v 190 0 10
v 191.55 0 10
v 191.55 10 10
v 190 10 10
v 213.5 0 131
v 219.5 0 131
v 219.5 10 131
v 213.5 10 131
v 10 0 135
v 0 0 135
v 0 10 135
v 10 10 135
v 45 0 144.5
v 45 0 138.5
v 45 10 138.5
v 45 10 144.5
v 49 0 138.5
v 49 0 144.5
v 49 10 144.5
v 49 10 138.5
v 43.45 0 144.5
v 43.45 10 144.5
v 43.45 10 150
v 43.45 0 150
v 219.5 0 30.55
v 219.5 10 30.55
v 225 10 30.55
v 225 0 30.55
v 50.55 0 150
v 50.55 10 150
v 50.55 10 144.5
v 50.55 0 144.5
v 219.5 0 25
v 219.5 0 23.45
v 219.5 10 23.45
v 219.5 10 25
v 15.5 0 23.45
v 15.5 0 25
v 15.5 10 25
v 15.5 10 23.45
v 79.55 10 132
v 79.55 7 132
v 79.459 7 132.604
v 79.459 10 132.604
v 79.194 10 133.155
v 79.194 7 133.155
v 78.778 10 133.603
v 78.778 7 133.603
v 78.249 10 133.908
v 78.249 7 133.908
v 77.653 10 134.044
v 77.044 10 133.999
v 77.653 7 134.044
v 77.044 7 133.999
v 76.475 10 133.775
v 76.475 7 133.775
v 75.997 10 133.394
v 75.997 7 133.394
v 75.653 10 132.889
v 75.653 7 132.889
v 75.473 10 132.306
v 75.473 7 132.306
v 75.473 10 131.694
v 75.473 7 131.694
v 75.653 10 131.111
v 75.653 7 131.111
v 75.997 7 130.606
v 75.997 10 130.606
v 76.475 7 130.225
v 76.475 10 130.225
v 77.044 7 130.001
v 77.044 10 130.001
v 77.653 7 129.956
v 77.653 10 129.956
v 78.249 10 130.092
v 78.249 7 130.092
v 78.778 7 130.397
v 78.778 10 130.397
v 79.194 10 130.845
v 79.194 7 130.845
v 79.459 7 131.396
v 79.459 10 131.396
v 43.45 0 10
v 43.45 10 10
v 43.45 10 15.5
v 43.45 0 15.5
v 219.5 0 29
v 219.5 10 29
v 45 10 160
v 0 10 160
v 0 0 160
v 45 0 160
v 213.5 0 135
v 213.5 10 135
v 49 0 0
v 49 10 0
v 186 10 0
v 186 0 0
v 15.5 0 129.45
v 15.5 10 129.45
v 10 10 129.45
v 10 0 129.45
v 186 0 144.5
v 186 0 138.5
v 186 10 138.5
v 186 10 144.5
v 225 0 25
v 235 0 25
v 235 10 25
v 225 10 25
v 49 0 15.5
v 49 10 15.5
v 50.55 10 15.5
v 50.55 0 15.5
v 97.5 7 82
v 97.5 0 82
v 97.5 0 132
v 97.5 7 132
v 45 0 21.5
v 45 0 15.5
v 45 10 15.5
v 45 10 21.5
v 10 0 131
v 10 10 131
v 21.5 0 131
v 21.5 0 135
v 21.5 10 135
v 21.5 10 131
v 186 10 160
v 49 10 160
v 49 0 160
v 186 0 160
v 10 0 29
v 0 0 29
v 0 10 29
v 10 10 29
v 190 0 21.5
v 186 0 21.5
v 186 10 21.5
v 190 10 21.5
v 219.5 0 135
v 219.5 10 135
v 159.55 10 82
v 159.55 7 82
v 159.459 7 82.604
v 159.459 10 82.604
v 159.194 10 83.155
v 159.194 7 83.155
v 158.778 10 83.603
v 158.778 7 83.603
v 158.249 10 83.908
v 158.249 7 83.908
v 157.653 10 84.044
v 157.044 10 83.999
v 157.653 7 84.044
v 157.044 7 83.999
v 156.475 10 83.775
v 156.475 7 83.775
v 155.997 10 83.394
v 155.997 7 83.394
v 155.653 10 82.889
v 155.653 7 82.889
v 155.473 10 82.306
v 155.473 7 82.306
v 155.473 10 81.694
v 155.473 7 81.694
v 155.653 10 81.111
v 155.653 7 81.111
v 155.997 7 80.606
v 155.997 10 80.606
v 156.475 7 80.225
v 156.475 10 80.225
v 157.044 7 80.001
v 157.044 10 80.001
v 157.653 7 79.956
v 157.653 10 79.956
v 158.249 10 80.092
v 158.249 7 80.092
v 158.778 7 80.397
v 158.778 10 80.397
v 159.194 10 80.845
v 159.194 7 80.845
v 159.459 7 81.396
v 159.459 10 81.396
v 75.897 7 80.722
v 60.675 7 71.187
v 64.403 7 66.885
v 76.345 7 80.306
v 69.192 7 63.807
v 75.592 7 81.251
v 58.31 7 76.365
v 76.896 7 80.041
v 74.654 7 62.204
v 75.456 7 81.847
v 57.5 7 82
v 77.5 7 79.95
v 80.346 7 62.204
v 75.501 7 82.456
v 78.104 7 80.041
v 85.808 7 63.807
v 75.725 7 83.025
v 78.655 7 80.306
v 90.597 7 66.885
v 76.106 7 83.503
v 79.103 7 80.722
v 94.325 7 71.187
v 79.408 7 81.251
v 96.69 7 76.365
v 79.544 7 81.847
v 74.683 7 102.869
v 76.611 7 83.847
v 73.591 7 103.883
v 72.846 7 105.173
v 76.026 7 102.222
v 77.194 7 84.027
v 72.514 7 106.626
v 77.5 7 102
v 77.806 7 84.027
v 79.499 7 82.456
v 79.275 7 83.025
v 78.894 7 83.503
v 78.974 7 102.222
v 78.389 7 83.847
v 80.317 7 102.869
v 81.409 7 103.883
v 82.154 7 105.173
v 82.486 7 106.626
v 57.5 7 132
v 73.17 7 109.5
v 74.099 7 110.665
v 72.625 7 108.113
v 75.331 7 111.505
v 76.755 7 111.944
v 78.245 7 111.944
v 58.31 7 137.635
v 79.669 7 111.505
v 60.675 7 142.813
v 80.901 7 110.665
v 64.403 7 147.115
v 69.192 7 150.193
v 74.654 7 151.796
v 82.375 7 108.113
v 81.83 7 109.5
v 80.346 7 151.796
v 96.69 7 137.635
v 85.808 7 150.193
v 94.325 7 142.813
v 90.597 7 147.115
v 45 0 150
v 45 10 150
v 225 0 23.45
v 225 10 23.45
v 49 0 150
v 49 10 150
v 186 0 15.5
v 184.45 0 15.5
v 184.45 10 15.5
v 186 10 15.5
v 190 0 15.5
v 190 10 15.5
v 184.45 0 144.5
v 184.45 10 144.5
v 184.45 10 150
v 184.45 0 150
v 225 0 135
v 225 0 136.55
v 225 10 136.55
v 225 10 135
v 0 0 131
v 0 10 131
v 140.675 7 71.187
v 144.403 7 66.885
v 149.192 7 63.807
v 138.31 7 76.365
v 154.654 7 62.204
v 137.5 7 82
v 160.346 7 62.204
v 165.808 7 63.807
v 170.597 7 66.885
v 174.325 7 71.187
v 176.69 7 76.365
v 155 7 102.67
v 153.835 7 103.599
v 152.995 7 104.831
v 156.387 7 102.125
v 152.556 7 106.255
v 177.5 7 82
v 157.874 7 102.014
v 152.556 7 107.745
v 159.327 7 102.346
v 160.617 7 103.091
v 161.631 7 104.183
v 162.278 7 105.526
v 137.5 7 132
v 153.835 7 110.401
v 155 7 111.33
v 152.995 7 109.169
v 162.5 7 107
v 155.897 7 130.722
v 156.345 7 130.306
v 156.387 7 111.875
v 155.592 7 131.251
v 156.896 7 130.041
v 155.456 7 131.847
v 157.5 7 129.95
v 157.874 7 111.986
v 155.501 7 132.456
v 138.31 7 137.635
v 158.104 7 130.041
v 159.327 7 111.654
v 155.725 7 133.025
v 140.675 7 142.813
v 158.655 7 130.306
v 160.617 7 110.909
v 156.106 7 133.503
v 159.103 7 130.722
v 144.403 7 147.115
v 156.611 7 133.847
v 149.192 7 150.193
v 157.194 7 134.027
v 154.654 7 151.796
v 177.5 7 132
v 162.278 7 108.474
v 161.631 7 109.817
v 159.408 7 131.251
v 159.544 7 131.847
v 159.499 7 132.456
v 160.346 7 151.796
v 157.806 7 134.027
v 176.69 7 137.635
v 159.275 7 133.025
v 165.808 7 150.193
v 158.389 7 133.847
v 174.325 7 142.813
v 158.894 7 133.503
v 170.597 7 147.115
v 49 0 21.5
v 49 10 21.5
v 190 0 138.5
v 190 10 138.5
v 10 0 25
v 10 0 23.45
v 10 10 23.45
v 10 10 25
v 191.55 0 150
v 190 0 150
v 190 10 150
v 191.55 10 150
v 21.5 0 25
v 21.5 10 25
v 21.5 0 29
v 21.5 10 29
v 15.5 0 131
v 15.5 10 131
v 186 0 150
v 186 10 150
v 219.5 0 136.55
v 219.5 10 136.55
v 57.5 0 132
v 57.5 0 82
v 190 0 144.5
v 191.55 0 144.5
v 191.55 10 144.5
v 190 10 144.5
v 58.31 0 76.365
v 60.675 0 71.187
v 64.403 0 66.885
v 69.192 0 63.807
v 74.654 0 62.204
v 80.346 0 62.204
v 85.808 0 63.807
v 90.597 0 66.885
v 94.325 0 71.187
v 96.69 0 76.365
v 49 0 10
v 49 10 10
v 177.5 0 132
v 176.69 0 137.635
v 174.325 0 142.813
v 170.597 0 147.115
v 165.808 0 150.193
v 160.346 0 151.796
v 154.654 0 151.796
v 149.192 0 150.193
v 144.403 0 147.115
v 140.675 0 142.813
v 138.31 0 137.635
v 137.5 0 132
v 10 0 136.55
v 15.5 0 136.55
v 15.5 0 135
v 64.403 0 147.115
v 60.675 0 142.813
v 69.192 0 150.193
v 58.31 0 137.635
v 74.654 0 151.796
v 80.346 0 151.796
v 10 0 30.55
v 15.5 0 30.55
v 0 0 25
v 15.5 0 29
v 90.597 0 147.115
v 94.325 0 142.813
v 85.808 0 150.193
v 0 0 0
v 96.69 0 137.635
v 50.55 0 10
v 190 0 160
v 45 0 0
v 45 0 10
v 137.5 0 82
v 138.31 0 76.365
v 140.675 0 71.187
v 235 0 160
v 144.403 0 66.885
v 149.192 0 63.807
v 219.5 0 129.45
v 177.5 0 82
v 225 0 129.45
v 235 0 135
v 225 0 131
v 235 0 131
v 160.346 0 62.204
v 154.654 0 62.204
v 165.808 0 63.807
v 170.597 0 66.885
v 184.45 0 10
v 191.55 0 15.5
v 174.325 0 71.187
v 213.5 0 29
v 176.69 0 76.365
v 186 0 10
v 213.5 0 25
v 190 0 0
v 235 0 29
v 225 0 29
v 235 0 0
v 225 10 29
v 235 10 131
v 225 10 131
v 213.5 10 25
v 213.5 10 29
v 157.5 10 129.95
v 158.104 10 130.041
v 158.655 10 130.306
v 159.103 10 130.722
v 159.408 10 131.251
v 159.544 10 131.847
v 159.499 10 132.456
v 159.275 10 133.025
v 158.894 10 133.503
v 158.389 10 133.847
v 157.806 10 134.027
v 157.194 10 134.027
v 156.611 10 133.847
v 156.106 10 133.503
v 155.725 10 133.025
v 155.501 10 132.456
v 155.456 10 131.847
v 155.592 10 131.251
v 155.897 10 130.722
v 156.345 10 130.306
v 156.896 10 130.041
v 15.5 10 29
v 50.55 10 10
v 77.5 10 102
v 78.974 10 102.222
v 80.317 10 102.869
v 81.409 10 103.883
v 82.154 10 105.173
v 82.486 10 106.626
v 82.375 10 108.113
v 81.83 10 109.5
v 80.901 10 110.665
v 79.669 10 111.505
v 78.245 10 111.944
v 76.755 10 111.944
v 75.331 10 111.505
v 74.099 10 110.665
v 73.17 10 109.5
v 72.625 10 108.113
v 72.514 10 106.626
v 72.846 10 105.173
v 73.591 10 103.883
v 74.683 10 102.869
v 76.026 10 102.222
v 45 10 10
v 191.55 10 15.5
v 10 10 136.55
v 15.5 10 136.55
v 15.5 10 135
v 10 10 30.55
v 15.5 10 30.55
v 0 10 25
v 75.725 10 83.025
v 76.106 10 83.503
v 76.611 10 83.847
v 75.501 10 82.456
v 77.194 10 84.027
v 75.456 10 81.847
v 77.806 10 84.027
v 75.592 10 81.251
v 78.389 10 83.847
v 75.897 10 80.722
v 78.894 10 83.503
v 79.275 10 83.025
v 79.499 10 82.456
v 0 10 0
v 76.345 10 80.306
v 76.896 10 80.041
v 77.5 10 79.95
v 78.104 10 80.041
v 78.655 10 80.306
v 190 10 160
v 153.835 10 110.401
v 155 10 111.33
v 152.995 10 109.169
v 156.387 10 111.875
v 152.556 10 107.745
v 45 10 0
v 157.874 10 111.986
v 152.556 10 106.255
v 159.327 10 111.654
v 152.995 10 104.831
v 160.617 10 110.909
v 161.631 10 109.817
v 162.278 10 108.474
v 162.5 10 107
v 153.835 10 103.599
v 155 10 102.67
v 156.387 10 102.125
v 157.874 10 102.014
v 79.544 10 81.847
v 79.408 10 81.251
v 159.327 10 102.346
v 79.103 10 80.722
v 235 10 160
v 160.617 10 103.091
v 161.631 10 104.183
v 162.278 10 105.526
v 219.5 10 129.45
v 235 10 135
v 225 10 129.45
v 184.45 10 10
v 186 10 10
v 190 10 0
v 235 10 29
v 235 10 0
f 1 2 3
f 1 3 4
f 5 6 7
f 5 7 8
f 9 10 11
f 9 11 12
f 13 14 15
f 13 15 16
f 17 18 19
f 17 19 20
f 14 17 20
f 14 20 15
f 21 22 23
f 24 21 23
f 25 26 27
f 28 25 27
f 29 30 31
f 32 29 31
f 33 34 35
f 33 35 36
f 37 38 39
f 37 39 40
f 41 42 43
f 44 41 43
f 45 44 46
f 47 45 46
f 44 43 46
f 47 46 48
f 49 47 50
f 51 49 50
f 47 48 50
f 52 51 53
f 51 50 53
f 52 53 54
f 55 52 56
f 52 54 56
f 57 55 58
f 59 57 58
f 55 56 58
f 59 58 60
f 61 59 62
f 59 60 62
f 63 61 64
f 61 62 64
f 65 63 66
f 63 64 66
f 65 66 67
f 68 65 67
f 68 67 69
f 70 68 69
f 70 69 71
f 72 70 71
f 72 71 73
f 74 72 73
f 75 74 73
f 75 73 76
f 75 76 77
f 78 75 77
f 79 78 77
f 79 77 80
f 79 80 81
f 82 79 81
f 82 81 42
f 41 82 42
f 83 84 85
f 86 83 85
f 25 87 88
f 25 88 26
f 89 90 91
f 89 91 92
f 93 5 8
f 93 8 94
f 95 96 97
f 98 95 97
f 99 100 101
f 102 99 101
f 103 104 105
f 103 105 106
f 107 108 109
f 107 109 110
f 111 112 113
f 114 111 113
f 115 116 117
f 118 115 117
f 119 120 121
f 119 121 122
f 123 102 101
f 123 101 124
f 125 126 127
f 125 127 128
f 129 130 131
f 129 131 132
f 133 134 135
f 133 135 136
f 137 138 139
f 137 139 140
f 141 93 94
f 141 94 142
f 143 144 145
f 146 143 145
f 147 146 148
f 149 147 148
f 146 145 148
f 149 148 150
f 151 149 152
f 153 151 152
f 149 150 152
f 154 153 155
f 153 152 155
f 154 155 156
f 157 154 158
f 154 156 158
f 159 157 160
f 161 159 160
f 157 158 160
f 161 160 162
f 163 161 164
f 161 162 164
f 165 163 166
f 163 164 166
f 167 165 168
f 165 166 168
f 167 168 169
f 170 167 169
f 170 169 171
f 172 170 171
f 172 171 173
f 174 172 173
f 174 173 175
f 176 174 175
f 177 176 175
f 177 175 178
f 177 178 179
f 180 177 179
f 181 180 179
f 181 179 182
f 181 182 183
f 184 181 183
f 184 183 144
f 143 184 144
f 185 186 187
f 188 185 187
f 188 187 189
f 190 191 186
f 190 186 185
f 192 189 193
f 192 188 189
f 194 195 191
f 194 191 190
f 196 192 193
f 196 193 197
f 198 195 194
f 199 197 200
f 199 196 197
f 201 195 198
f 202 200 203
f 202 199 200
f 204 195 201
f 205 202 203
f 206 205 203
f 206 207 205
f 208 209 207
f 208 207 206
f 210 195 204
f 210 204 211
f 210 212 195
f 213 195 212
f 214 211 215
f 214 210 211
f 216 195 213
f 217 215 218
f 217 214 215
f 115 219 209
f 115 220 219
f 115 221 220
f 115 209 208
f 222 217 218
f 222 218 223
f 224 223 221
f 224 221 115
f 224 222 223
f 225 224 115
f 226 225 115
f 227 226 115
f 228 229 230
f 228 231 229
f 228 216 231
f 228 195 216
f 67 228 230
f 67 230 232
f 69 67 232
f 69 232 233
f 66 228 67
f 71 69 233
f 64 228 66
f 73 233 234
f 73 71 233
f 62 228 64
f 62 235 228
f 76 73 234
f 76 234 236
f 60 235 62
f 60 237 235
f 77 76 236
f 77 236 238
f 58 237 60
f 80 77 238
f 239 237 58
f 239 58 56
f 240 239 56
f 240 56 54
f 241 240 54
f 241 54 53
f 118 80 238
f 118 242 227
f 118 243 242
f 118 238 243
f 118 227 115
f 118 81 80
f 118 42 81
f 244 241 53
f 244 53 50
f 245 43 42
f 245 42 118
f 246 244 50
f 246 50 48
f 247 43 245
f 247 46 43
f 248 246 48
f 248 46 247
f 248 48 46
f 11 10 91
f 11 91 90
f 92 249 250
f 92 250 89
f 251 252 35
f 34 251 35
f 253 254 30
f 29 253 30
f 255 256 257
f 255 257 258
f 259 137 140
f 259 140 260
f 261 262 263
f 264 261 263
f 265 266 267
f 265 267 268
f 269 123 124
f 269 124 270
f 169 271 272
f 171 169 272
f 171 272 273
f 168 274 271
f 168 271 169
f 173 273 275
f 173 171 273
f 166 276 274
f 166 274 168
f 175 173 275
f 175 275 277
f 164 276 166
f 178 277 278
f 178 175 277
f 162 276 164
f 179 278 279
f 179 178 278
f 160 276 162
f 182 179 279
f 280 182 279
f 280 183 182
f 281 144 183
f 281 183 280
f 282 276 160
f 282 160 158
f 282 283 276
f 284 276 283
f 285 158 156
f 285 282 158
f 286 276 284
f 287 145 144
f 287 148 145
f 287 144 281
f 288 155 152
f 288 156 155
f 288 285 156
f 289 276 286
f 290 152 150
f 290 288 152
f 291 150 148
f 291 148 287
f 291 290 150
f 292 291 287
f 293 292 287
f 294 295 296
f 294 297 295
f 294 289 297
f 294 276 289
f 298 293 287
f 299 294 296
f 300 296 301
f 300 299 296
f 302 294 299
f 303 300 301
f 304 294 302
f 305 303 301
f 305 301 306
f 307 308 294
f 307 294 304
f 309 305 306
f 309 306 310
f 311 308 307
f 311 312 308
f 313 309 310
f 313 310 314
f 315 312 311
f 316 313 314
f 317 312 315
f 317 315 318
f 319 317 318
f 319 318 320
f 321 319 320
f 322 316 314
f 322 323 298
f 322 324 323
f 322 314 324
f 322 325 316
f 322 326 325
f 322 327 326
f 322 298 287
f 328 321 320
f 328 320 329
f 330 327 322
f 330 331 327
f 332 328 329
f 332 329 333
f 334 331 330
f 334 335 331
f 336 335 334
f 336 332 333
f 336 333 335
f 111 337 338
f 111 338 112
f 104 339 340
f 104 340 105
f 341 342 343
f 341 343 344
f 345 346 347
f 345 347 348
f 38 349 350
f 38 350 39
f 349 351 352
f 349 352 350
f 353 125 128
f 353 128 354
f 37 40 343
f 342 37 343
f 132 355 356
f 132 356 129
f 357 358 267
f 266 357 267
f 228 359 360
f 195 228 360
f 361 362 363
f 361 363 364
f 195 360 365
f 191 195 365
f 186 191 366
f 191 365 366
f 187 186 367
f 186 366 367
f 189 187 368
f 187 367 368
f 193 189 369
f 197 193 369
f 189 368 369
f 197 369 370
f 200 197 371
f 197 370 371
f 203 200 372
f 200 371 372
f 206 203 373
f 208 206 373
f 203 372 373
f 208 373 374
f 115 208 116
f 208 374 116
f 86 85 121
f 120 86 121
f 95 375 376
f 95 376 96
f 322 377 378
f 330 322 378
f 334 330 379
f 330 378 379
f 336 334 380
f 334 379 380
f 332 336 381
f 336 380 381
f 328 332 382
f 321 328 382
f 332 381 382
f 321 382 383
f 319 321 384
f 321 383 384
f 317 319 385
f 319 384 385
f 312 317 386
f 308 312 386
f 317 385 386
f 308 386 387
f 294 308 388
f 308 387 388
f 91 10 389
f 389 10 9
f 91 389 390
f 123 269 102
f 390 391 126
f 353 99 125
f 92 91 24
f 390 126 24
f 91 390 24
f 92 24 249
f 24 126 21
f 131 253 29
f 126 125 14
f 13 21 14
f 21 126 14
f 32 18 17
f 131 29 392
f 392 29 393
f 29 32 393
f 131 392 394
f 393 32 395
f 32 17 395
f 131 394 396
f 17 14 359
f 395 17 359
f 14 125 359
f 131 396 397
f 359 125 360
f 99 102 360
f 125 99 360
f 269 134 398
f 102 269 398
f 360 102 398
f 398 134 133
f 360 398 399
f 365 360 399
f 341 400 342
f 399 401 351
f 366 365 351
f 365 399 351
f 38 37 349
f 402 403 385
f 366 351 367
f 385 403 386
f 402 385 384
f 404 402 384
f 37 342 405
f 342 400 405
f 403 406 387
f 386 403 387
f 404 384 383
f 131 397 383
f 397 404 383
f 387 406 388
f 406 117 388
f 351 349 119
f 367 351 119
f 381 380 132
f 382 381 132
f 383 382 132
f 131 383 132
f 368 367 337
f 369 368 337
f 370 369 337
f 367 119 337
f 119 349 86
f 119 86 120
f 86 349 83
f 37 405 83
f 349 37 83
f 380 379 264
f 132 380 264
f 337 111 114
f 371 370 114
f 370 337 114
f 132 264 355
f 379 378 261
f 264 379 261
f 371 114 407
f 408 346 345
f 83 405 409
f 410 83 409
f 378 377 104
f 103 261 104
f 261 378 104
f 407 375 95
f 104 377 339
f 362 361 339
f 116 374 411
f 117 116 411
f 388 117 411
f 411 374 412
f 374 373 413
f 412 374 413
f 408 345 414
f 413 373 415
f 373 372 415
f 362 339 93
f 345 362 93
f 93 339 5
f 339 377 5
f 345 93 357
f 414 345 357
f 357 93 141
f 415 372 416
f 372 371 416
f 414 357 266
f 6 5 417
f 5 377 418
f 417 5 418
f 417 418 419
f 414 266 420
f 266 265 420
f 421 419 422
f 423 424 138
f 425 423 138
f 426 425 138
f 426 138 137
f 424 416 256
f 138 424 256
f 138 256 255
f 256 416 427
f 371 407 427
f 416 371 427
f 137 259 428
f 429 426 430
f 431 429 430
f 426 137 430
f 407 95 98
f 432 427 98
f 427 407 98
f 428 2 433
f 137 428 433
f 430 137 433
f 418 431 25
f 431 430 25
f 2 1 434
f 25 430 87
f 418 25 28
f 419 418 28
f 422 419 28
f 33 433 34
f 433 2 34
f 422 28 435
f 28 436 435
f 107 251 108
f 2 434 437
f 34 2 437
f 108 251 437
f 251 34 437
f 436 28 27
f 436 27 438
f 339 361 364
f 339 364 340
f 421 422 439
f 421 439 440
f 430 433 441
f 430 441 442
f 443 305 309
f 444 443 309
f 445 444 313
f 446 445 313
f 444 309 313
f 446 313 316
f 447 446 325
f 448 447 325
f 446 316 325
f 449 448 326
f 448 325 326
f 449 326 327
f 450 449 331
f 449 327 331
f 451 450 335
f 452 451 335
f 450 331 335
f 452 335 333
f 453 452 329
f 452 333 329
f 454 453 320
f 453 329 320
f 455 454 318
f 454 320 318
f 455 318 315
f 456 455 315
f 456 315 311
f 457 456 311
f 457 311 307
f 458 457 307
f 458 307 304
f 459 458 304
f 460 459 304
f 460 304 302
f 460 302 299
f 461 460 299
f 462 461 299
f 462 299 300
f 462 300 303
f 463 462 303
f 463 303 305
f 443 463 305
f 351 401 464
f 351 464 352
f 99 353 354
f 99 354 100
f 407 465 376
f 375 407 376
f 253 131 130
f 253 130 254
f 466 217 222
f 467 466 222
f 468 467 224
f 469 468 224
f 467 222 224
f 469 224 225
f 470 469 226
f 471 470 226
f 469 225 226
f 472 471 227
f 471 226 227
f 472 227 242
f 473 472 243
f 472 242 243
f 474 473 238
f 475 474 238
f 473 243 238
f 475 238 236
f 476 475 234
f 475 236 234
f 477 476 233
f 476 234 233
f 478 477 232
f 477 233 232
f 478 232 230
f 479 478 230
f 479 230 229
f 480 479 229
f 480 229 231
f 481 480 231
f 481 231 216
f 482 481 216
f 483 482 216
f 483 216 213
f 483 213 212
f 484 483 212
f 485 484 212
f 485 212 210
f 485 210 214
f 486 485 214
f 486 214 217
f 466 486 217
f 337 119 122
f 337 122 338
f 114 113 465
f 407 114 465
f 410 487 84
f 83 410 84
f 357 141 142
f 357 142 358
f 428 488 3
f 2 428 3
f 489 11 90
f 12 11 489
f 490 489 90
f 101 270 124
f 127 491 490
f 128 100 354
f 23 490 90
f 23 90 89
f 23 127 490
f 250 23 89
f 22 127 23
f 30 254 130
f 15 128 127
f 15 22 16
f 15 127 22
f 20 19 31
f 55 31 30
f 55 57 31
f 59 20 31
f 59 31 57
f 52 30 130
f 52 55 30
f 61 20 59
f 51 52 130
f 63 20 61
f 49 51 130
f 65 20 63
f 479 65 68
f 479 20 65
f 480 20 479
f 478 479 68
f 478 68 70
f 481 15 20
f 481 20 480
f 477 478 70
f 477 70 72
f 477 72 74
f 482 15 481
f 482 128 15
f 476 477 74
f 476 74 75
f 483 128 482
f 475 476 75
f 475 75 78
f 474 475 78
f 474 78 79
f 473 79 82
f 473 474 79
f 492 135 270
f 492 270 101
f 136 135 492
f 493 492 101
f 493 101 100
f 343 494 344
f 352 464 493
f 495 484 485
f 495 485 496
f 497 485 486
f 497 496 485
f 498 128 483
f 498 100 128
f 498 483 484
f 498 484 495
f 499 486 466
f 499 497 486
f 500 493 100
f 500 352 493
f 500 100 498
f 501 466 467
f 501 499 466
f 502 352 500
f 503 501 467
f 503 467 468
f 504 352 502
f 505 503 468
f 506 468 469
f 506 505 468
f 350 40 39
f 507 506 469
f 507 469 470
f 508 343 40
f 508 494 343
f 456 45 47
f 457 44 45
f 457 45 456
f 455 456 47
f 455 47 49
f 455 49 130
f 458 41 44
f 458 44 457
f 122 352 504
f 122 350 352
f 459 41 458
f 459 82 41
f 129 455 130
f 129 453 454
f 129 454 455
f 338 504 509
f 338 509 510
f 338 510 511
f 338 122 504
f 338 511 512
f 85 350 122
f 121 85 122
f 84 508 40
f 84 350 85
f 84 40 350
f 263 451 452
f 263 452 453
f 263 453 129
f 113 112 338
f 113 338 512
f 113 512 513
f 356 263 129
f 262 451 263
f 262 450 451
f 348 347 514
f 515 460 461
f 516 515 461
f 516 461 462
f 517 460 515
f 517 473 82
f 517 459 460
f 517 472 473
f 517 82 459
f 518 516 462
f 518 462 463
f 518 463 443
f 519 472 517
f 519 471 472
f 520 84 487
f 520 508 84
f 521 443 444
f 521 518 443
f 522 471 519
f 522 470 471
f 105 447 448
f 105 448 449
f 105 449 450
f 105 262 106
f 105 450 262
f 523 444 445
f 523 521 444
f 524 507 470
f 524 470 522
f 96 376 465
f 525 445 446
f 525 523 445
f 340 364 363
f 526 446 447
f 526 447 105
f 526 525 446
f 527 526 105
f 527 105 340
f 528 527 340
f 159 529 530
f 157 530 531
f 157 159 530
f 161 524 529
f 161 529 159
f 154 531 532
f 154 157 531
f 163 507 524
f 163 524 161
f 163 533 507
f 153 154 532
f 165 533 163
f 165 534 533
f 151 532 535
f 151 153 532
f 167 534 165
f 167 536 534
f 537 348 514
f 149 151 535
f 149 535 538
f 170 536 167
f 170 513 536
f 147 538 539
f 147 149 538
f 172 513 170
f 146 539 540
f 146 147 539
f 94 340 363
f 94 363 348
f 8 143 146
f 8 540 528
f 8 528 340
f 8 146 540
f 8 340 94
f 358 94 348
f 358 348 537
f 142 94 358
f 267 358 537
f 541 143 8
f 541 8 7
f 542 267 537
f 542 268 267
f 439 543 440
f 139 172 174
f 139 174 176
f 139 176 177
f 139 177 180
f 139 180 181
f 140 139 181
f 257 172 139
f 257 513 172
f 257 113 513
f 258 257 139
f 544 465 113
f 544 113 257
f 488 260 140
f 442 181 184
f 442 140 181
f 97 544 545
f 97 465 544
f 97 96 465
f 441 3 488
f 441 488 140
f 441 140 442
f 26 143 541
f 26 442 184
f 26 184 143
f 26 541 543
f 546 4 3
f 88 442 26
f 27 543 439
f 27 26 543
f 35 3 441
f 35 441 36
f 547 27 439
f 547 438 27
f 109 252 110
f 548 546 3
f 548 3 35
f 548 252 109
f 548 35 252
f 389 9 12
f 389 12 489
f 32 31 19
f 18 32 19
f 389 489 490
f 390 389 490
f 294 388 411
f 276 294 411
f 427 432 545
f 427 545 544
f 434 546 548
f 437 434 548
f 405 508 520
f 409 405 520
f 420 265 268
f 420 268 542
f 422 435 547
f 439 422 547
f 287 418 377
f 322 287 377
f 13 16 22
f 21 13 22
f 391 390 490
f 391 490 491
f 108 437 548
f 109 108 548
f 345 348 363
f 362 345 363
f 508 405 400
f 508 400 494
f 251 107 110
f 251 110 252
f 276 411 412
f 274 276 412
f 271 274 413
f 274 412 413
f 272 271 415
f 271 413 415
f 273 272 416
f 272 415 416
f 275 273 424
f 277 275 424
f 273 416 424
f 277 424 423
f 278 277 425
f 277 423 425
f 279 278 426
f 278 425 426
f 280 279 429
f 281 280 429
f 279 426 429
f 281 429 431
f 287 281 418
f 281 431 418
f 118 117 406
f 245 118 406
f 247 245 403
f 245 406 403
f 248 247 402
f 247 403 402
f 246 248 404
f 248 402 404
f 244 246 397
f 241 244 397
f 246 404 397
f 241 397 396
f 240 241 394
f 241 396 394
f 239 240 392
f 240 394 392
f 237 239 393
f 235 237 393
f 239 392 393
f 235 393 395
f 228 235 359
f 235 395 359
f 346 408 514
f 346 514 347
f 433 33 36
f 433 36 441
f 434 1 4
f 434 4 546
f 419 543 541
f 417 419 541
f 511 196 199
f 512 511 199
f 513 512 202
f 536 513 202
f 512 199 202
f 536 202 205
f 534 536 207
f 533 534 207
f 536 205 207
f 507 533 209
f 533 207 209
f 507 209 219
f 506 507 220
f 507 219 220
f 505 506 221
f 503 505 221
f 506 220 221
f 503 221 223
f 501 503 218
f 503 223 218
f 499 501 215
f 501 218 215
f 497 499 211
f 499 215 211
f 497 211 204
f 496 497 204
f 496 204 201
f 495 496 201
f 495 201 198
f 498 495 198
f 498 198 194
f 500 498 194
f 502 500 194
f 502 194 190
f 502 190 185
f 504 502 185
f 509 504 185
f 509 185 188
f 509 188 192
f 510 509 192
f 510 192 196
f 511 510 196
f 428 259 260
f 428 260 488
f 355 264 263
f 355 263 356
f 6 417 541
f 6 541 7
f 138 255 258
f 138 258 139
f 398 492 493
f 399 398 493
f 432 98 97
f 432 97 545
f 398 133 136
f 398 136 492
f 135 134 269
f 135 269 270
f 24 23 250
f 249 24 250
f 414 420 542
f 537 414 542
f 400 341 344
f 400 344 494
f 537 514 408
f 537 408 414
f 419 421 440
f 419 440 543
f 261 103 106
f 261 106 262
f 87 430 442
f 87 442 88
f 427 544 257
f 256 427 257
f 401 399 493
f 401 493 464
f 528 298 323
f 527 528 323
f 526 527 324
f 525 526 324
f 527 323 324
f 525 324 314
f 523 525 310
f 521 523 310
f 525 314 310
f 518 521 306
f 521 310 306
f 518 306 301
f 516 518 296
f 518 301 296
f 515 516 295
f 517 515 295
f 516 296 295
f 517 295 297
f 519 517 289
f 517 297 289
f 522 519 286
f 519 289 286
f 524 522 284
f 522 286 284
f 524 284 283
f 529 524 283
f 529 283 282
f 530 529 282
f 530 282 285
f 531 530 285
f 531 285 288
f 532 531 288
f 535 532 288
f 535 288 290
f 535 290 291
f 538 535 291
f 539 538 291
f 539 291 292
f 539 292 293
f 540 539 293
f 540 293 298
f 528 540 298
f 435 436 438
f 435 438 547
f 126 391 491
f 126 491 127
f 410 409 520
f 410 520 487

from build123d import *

# Parameters (mm, degrees)
SKETCH1_W               = 235
SKETCH1_H               = 10
BOSS_EXTRUDE1_DEPTH     = 160
CUT_EXTRUDE1_DEPTH      = 7
SKETCH5_R               = 5
CUT_EXTRUDE2_DEPTH      = 33
SKETCH6_R               = 2.05
CUT_EXTRUDE3_DEPTH      = 33
ENL_V_MAT_EXTRU_2_DEPTH = 10
ENL_V_MAT_EXTRU_3_DEPTH = 10


with BuildPart() as part:
    # Sketch1 → Boss-Extrude1 (new body)
    with BuildSketch(Plane.XY):
        with Locations((117.5, 5)):
            Rectangle(SKETCH1_W, SKETCH1_H)
    extrude(amount=BOSS_EXTRUDE1_DEPTH)

    # Sketch3 → Cut-Extrude1 (cut)
    with BuildSketch(Plane.XZ):
        with BuildLine():
            Line((137.5, 132), (137.5, 82))
            ThreePointArc((137.5, 82), (157.5, 62), (177.5, 82))
            Line((177.5, 82), (177.5, 132))
            ThreePointArc((177.5, 132), (157.5, 152), (137.5, 132))
        make_face()
        with BuildLine():
            Line((57.5, 132), (57.5, 82))
            ThreePointArc((57.5, 82), (77.5, 62), (97.5, 82))
            Line((97.5, 82), (97.5, 132))
            ThreePointArc((97.5, 132), (77.5, 152), (57.5, 132))
        make_face()
    extrude(amount=-CUT_EXTRUDE1_DEPTH, mode=Mode.SUBTRACT)

    # Sketch5 → Cut-Extrude2 (cut)
    with BuildSketch(Plane.XZ.offset(-7)):
        with Locations(Location((77.5, 107, 0), (0, 0, 270))):
            Circle(SKETCH5_R)
        with Locations((157.5, 107)):
            Circle(SKETCH5_R)
    extrude(amount=-CUT_EXTRUDE2_DEPTH, mode=Mode.SUBTRACT)

    # Sketch6 → Cut-Extrude3 (cut)
    with BuildSketch(Plane.XZ.offset(-7)):
        with Locations(Location((77.5, 82, 0), (0, 0, 270))):
            Circle(SKETCH6_R)
        with Locations((77.5, 132)):
            Circle(SKETCH6_R)
        with Locations((157.5, 82)):
            Circle(SKETCH6_R)
        with Locations(Location((157.5, 132, 0), (0, 0, 270))):
            Circle(SKETCH6_R)
    extrude(amount=-CUT_EXTRUDE3_DEPTH, mode=Mode.SUBTRACT)

    # Esquisse2 → Enlèv. mat.-Extru.2 (cut)
    with BuildSketch(Plane.XZ):
        Polygon((0, 135), (10, 135), (10, 136.55), (15.5, 136.55), (15.5, 135), (21.5, 135), (21.5, 131), (15.5, 131), (15.5, 129.45), (10, 129.45), (10, 131), (0, 131), align=None)
        Polygon((0, 29), (10, 29), (10, 30.55), (15.5, 30.55), (15.5, 29), (21.5, 29), (21.5, 25), (15.5, 25), (15.5, 23.45), (10, 23.45), (10, 25), (0, 25), align=None)
        Polygon((235, 25), (225, 25), (225, 23.45), (219.5, 23.45), (219.5, 25), (213.5, 25), (213.5, 29), (219.5, 29), (219.5, 30.55), (225, 30.55), (225, 29), (235, 29), align=None)
        Polygon((235, 131), (225, 131), (225, 129.45), (219.5, 129.45), (219.5, 131), (213.5, 131), (213.5, 135), (219.5, 135), (219.5, 136.55), (225, 136.55), (225, 135), (235, 135), align=None)
    extrude(amount=-ENL_V_MAT_EXTRU_2_DEPTH, mode=Mode.SUBTRACT)

    # Esquisse3 → Enlèv. mat.-Extru.3 (cut)
    with BuildSketch(Plane.XZ):
        Polygon((49, 160), (49, 150), (50.55, 150), (50.55, 144.5), (49, 144.5), (49, 138.5), (45, 138.5), (45, 144.5), (43.45, 144.5), (43.45, 150), (45, 150), (45, 160), align=None)
        Polygon((190, 138.5), (186, 138.5), (186, 144.5), (184.45, 144.5), (184.45, 150), (186, 150), (186, 160), (190, 160), (190, 150), (191.55, 150), (191.55, 144.5), (190, 144.5), align=None)
        Polygon((186, 0), (186, 10), (184.45, 10), (184.45, 15.5), (186, 15.5), (186, 21.5), (190, 21.5), (190, 15.5), (191.55, 15.5), (191.55, 10), (190, 10), (190, 0), align=None)
        Polygon((45, 21.5), (49, 21.5), (49, 15.5), (50.55, 15.5), (50.55, 10), (49, 10), (49, 0), (45, 0), (45, 10), (43.45, 10), (43.45, 15.5), (45, 15.5), align=None)
    extrude(amount=-ENL_V_MAT_EXTRU_3_DEPTH, mode=Mode.SUBTRACT)


solid = part.part
